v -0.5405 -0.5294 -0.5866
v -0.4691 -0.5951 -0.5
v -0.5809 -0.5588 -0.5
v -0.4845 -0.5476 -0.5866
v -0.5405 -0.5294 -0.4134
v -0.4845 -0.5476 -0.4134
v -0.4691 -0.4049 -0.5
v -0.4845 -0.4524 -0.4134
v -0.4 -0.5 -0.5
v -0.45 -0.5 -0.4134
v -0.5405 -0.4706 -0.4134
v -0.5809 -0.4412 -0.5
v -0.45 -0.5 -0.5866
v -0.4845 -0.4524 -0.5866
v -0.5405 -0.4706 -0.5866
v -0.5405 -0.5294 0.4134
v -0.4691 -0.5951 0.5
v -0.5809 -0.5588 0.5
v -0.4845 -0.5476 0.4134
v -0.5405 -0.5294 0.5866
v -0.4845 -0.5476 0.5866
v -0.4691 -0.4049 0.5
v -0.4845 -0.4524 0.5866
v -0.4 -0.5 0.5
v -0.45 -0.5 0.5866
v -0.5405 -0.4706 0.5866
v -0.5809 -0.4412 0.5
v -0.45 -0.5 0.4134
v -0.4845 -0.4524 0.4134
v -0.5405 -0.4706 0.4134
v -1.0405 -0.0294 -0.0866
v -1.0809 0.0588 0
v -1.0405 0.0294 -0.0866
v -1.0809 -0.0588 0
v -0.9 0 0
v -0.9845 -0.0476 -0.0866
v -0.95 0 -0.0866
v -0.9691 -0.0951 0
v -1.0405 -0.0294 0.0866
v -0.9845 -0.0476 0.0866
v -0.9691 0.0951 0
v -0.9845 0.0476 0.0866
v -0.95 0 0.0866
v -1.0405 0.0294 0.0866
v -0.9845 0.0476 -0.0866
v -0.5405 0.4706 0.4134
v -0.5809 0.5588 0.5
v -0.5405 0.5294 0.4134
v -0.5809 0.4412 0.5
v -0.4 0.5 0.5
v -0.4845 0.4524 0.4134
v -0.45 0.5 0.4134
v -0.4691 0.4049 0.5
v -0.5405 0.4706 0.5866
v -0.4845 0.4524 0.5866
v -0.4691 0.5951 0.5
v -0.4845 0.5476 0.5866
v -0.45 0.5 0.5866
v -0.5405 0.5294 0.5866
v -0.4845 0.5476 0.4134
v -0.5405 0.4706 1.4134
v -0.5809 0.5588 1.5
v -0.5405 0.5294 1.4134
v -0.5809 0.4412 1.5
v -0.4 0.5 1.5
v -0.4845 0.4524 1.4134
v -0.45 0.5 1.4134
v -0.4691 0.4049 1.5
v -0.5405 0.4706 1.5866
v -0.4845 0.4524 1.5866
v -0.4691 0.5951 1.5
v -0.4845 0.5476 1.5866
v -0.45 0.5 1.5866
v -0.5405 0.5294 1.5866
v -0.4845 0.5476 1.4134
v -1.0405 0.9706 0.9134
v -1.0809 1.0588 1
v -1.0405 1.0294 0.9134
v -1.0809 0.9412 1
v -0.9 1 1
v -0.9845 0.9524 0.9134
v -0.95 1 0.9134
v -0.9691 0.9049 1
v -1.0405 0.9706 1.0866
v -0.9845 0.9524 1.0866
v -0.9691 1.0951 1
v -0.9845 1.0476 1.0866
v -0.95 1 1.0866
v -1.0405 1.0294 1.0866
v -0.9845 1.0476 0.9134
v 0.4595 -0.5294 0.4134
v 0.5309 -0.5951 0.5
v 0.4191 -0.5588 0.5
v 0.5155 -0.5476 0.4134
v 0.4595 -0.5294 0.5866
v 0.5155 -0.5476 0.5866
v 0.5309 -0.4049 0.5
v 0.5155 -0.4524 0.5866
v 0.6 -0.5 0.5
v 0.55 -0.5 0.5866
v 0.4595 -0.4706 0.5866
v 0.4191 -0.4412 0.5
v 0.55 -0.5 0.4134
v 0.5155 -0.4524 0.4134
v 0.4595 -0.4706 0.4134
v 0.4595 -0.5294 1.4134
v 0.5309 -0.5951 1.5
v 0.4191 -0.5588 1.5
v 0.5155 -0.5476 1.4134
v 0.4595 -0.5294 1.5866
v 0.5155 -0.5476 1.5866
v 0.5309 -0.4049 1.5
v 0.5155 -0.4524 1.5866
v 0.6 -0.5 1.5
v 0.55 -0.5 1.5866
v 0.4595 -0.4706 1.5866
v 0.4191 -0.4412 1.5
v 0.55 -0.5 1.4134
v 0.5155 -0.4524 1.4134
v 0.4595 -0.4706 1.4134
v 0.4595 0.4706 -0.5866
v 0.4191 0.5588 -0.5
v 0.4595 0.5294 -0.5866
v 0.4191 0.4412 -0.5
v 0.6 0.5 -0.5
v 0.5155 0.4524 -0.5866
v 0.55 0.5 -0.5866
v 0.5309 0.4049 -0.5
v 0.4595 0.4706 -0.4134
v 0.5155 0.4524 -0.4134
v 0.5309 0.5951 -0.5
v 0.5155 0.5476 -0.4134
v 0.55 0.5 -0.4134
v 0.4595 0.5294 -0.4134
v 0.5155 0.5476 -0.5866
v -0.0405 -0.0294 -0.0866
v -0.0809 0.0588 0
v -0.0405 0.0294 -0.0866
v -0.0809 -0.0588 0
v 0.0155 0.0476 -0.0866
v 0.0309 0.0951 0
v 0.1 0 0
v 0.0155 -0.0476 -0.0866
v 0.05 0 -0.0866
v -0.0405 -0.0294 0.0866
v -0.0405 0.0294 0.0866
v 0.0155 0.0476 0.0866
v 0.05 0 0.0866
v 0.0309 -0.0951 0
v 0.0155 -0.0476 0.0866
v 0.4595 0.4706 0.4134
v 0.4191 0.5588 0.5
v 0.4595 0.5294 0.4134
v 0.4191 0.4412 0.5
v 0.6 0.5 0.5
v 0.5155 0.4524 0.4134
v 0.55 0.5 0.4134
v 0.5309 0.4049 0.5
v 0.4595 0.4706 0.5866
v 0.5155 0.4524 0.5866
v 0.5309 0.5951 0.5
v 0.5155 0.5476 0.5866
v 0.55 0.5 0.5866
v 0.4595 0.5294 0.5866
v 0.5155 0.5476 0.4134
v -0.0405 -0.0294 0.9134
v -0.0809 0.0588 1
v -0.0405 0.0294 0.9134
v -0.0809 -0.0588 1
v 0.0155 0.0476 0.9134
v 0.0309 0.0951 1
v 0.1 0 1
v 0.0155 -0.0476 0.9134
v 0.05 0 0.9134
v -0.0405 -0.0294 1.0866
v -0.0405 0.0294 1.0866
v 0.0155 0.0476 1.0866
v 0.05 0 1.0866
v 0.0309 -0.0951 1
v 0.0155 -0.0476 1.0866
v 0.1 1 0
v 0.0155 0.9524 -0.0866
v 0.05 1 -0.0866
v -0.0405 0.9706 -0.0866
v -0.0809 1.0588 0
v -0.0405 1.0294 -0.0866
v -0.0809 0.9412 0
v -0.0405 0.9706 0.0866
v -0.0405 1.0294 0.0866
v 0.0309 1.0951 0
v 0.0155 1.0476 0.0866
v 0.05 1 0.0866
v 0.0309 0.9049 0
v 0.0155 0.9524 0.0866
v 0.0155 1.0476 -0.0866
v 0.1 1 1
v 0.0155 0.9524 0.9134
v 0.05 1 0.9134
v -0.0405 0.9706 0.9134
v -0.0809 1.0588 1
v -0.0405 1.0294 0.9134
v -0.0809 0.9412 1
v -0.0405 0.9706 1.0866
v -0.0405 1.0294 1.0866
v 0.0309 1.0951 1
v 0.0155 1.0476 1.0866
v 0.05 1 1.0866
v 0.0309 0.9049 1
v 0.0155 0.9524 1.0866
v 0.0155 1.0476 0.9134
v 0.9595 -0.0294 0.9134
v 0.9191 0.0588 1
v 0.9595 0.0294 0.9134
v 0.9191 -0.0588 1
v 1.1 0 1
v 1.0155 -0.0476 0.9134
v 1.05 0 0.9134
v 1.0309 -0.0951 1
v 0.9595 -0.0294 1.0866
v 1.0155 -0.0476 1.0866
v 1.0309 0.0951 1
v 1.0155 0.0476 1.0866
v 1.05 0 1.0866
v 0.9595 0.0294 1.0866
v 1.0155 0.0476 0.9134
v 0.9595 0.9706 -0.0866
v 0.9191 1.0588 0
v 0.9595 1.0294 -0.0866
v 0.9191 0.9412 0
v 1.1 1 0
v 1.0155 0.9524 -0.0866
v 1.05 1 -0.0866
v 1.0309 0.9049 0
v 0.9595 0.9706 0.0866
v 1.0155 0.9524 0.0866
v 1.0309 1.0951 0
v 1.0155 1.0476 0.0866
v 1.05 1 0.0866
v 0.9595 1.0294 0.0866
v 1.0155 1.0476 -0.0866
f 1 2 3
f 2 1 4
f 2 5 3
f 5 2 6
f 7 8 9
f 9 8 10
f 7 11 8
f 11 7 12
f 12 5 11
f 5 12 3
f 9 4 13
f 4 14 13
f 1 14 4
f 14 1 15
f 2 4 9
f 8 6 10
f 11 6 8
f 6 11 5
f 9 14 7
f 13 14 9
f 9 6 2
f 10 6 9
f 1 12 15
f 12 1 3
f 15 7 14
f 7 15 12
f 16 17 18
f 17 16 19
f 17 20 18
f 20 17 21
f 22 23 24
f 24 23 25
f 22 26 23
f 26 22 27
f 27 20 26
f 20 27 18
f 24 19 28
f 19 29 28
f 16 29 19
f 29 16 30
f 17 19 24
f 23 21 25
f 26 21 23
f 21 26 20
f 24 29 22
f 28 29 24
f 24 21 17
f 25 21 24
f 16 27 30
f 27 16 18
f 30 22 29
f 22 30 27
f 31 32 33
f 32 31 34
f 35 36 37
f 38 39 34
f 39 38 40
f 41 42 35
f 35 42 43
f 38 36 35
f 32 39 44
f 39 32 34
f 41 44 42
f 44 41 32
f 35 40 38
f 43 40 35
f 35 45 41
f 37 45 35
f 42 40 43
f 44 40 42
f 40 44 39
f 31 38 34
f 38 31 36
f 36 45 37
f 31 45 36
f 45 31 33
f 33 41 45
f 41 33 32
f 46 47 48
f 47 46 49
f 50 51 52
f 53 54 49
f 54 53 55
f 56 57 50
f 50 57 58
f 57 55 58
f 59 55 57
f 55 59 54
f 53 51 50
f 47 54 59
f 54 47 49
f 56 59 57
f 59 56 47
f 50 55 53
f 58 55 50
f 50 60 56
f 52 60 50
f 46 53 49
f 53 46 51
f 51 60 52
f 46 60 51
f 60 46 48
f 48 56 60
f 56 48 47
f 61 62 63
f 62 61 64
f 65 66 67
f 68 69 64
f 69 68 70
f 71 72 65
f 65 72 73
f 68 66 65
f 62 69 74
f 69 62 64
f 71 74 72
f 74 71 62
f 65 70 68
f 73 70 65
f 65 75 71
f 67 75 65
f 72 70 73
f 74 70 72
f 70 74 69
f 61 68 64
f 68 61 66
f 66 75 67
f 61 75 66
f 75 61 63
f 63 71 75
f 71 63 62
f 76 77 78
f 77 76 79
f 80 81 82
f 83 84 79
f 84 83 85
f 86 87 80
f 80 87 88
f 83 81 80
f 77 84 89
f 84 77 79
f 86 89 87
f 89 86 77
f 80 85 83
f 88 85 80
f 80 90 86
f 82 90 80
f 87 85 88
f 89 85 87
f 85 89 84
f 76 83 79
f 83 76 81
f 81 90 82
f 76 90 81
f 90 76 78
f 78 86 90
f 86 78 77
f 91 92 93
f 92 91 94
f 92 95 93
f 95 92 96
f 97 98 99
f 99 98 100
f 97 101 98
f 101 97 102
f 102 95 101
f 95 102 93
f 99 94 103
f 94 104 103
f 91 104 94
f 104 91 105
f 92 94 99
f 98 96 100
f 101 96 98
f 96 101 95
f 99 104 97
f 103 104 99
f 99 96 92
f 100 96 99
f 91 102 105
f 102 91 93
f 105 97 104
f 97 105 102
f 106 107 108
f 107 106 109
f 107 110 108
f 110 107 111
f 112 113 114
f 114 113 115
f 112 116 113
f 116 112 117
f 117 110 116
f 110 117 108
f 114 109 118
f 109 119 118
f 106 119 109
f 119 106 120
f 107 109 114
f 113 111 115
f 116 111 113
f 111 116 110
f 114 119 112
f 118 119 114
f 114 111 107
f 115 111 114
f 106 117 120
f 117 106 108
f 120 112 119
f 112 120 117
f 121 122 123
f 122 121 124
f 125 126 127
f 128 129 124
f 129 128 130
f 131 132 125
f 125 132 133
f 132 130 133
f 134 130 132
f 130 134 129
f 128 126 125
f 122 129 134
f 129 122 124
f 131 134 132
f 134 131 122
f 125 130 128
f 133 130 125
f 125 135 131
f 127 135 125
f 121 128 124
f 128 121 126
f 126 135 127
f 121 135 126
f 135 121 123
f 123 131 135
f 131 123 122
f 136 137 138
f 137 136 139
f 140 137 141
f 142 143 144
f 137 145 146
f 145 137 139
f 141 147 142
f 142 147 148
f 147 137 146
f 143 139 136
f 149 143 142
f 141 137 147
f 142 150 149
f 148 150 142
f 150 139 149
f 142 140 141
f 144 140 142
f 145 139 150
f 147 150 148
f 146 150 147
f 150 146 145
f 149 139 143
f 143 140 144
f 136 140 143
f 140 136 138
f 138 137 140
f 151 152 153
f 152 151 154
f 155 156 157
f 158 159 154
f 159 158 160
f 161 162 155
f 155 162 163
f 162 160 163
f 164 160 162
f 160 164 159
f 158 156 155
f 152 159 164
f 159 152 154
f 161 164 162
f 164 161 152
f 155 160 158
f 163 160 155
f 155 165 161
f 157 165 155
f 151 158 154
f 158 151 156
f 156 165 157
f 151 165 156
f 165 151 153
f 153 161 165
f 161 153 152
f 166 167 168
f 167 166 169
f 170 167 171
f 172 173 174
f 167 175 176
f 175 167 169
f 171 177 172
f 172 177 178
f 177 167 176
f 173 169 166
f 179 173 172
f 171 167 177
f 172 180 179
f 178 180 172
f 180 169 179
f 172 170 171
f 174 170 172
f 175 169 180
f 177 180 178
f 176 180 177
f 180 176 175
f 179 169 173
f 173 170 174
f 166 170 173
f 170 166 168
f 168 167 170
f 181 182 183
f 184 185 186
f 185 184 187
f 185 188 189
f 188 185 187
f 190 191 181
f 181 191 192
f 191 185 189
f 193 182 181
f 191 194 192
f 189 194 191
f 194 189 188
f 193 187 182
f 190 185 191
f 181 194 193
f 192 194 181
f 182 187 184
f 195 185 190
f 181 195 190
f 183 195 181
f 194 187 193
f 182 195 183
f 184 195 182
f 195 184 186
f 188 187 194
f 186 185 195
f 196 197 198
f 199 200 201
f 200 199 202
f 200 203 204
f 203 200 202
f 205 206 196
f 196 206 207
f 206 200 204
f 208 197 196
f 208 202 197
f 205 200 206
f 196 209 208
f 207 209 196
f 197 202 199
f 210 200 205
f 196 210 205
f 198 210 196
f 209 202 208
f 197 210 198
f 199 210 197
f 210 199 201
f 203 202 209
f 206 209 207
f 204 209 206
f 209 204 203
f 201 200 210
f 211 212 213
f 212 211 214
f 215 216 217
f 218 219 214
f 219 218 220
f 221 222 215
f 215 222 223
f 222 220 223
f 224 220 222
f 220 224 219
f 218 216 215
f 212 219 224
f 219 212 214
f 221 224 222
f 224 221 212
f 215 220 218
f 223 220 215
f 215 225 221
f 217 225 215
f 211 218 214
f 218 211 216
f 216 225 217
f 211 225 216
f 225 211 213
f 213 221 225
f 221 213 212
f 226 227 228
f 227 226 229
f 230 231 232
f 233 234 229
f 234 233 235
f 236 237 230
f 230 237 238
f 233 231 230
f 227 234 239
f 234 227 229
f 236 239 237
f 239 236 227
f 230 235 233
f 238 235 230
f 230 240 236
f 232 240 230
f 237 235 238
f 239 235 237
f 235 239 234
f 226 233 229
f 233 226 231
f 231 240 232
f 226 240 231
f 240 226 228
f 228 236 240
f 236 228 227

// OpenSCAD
// file: 3d_tetrahedres.scad
use <lattice.scad>;

// Check if a vertex is adjacent to the central layer (that sets the size of processor).
// n as n_code in article (starts at 1).
function central_layer(x, y, z, n) = ((x+z == n-2) || (x+z == n-1)) ? true : false;

// Elementary tetrahedron as described in Equation (18) of arXiv:1311.0879.
// x, y, z : coordinates of vector x in arXiv:1311.0879
// s : +- 1
// permut : integer between 0 and 5 (included) that describe the permutation (a, b, c) :
//          0 : (a, b, c) = (i, j, k)
//          1 : (a, b, c) = (i, k, j)
//          2 : (a, b, c) = (j, i, k)
//          3 : (a, b, c) = (j, k, i)
//          4 : (a, b, c) = (k, i, j)
//          5 : (a, b, c) = (k, j, i)
// n : we keep only tetrahedron included in the code structure indexed by n.
//     n is as in Equation (19) of arXiv:1311.0879 (starts at 1).
//     use -1 for no filter
 module tetraedre (x, y, z, s, permut, n) {
     // if (permut==0) {xa=1; ya=0; za=0; xb=0; yb=1; zb=0; xc=0; yc=0; zc=1;}
     // if (permut==1) {xa=1; ya=0; za=0; xb=0; yb=0; zb=1; xc=0; yc=1; zc=0;}
     // if (permut==2) {xa=0; ya=1; za=0; xb=1; yb=0; zb=0; xc=0; yc=0; zc=1;}
     // if (permut==3) {xa=0; ya=1; za=0; xb=0; yb=0; zb=1; xc=1; yc=0; zc=0;}
     // if (permut==4) {xa=0; ya=0; za=1; xb=1; yb=0; zb=0; xc=0; yc=1; zc=0;}
     // if (permut==5) {xa=0; ya=0; za=1; xb=0; yb=1; zb=0; xc=1; yc=0; zc=0;}
     xa = permut==0 || permut==1 ? 1 : 0;
     ya = permut==2 || permut==3 ? 1 : 0;
     za = permut==4 || permut==5 ? 1 : 0;
     xb = permut==2 || permut==4 ? 1 : 0;
     yb = permut==0 || permut==5 ? 1 : 0;
     zb = permut==1 || permut==3 ? 1 : 0;
     xc = permut==3 || permut==5 ? 1 : 0;
     yc = permut==1 || permut==4 ? 1 : 0;
     zc = permut==0 || permut==2 ? 1 : 0;

     // Coordinates of vertices of the tetrahedron.
     x1=x; y1=y; z1=z;                                               // x
     x2=x+xa; y2=y+ya; z2=z+za;                                      // x + a
     x3=x+(xa+s*xb+xc)/2; y3=y+(ya+s*yb+yc)/2; z3=z+(za+s*zb+zc)/2;  // x + (a+sb+c)/2
     x4=x+(xa+s*xb-xc)/2; y4=y+(ya+s*yb-yc)/2; z4=z+(za+s*zb-zc)/2;  // x + (a+sb-c)/2

     if (n == -1 || (
         filtre(x1, y1, z1, n)
         && filtre(x2, y2, z2, n)
         && filtre(x3, y3, z3, n)
         && filtre(x4, y4, z4, n)
     )) {
         // echo(x, y, z, s, permut, n);
         if (central_layer(x1, y1, z1, n)
             && central_layer(x2, y2, z2, n)
             && central_layer(x3, y3, z3, n)
             && central_layer(x4, y4, z4, n))
            {
             echo("One central tetraedron");  // For counting
             color("red")
             polyhedron(
                 points=[[x1,y1,z1], [x2,y2,z2], [x3,y3,z3], [x4,y4,z4]],
                 faces=[[0,1,2], [0,1,3], [0,2,3], [1,3,2]]
                );
            }
         else {
             polyhedron(
                 points=[[x1,y1,z1], [x2,y2,z2], [x3,y3,z3], [x4,y4,z4]],
                 faces=[[0,1,2], [0,1,3], [0,2,3], [1,3,2]]
                );
            }
        }
    }


n = 3;
grille(n);

for (x = [-1:n-1]) {
        for (y = [-1:n-1]) {
            for (z = [-1:n-1]) {
                for (s=[-1:2:1]) {
                    for (permut = [0:5]) {
                        tetraedre(x, y, z, s, permut, n);
                    }
                }
            }
        }
    }
// file: lattice.scad
// Centered cubic grid, as presented in Equation (18) from arXiv:1311.0879


//  Uncut centered cubic grid.
module maille(nb) {
    // Diameter of small balls
    rad = 0.1;
    for (x = [0:nb]) {
        for (y = [0:nb]) {
            for (z = [0:nb]) {
                type = abs((x + y + z) % 2);  // Correspond to color
                x2 = x+0.5; y2 = y+0.5; z2 = z+0.5;
                if (type == 0) {
                        color("red") translate([x, y, z]) sphere(rad);
                        color("blue") translate([x2, y2, z2]) sphere(rad);
                        }
                if (type == 1) {
                    color("green") translate([x, y, z]) sphere(rad);
                    color("yellow") translate([x2, y2, z2]) sphere(rad);
                    }
                }
            }
        }
    }



// Check Equation (19) of arXiv:1311.0879 (n stars at 1).
function filtre(x, y, z, n) = ((x+y+z <= 0 + 2*(n-1))
                               && (x-y-z <= 1/2)
                               && (-x+y-z <= 1)
                               && (-x-y+z <= 3/2)) ? true : false;


// Grid as presented in Equations (18) and (19) of arXiv:1311.0879.
// n : number n in Equation (19): index in the code family, starts at 1.
module grille(n) {
    // Diameter of small balls
    rad = 0.1;
    for (x = [-1:n-1]) {
        for (y = [-1:n-1]) {
            for (z = [-1:n-1]) {
                type = abs((x + y + z) % 2);  // Correspond to color
                if (filtre(x, y, z, n)) {
                    if (type == 0) {
                        color("red") translate([x, y, z]) sphere(rad);
                        }
                    if (type == 1) {
                        color("green") translate([x, y, z]) sphere(rad);
                        }
                    }
                x2 = x+0.5; y2 = y+0.5; z2 = z+0.5;
                if (filtre(x2, y2, z2, n)) {
                    if (type == 0) {
                        color("blue") translate([x2, y2, z2]) sphere(rad);
                        }
                    if (type == 1) {
                        color("yellow") translate([x2, y2, z2]) sphere(rad);
                        }
                    }
                }
            }
        }
    }

//maille(2);
grille(2);
// main file
use <lattice.scad>;
use <3d_tetrahedres.scad>;

// Layer 1 : 7 qubits
color("Orange") tetraedre(0, 0, 1, -1, 0, 2);
color("Orange") tetraedre(0, 0, 1, -1, 1, 2);
color("Orange") tetraedre(0, 1, 0, -1, 0, 2);
color("Orange") tetraedre(0, 0, 1, -1, 3, 2);
color("Orange") tetraedre(0, 1, 0, -1, 5, 2);
color("Orange") tetraedre(0, 0, 1, -1, 2, 2);
color("Orange") tetraedre(-1, 1, 1, -1, 0, 2);

// Layer 2 : 4 qubits
color("Cyan") tetraedre(0, 0, 0, 1, 3, 2);
color("Cyan") tetraedre(0, 0, 0, 1, 5, 2);
color("Cyan") tetraedre(0, 0, 0, 1, 2, 2);
color("Cyan") tetraedre(0, 0, 0, 1, 4, 2);

// Layer 3 : 2 qubits
color("Magenta") tetraedre(0, 0, 0, -1, 5, 2);
color("Magenta") tetraedre(0, 0, 0, -1, 4, 2);

// Layer 4 : 1 qubit
color("Chartreuse") tetraedre(-1, 0, 0, 1, 1, 2);

// Layer 5 : 1 qubit
color("black") tetraedre(-1, 0, 0, -1, 0, 2);

grille(2);
